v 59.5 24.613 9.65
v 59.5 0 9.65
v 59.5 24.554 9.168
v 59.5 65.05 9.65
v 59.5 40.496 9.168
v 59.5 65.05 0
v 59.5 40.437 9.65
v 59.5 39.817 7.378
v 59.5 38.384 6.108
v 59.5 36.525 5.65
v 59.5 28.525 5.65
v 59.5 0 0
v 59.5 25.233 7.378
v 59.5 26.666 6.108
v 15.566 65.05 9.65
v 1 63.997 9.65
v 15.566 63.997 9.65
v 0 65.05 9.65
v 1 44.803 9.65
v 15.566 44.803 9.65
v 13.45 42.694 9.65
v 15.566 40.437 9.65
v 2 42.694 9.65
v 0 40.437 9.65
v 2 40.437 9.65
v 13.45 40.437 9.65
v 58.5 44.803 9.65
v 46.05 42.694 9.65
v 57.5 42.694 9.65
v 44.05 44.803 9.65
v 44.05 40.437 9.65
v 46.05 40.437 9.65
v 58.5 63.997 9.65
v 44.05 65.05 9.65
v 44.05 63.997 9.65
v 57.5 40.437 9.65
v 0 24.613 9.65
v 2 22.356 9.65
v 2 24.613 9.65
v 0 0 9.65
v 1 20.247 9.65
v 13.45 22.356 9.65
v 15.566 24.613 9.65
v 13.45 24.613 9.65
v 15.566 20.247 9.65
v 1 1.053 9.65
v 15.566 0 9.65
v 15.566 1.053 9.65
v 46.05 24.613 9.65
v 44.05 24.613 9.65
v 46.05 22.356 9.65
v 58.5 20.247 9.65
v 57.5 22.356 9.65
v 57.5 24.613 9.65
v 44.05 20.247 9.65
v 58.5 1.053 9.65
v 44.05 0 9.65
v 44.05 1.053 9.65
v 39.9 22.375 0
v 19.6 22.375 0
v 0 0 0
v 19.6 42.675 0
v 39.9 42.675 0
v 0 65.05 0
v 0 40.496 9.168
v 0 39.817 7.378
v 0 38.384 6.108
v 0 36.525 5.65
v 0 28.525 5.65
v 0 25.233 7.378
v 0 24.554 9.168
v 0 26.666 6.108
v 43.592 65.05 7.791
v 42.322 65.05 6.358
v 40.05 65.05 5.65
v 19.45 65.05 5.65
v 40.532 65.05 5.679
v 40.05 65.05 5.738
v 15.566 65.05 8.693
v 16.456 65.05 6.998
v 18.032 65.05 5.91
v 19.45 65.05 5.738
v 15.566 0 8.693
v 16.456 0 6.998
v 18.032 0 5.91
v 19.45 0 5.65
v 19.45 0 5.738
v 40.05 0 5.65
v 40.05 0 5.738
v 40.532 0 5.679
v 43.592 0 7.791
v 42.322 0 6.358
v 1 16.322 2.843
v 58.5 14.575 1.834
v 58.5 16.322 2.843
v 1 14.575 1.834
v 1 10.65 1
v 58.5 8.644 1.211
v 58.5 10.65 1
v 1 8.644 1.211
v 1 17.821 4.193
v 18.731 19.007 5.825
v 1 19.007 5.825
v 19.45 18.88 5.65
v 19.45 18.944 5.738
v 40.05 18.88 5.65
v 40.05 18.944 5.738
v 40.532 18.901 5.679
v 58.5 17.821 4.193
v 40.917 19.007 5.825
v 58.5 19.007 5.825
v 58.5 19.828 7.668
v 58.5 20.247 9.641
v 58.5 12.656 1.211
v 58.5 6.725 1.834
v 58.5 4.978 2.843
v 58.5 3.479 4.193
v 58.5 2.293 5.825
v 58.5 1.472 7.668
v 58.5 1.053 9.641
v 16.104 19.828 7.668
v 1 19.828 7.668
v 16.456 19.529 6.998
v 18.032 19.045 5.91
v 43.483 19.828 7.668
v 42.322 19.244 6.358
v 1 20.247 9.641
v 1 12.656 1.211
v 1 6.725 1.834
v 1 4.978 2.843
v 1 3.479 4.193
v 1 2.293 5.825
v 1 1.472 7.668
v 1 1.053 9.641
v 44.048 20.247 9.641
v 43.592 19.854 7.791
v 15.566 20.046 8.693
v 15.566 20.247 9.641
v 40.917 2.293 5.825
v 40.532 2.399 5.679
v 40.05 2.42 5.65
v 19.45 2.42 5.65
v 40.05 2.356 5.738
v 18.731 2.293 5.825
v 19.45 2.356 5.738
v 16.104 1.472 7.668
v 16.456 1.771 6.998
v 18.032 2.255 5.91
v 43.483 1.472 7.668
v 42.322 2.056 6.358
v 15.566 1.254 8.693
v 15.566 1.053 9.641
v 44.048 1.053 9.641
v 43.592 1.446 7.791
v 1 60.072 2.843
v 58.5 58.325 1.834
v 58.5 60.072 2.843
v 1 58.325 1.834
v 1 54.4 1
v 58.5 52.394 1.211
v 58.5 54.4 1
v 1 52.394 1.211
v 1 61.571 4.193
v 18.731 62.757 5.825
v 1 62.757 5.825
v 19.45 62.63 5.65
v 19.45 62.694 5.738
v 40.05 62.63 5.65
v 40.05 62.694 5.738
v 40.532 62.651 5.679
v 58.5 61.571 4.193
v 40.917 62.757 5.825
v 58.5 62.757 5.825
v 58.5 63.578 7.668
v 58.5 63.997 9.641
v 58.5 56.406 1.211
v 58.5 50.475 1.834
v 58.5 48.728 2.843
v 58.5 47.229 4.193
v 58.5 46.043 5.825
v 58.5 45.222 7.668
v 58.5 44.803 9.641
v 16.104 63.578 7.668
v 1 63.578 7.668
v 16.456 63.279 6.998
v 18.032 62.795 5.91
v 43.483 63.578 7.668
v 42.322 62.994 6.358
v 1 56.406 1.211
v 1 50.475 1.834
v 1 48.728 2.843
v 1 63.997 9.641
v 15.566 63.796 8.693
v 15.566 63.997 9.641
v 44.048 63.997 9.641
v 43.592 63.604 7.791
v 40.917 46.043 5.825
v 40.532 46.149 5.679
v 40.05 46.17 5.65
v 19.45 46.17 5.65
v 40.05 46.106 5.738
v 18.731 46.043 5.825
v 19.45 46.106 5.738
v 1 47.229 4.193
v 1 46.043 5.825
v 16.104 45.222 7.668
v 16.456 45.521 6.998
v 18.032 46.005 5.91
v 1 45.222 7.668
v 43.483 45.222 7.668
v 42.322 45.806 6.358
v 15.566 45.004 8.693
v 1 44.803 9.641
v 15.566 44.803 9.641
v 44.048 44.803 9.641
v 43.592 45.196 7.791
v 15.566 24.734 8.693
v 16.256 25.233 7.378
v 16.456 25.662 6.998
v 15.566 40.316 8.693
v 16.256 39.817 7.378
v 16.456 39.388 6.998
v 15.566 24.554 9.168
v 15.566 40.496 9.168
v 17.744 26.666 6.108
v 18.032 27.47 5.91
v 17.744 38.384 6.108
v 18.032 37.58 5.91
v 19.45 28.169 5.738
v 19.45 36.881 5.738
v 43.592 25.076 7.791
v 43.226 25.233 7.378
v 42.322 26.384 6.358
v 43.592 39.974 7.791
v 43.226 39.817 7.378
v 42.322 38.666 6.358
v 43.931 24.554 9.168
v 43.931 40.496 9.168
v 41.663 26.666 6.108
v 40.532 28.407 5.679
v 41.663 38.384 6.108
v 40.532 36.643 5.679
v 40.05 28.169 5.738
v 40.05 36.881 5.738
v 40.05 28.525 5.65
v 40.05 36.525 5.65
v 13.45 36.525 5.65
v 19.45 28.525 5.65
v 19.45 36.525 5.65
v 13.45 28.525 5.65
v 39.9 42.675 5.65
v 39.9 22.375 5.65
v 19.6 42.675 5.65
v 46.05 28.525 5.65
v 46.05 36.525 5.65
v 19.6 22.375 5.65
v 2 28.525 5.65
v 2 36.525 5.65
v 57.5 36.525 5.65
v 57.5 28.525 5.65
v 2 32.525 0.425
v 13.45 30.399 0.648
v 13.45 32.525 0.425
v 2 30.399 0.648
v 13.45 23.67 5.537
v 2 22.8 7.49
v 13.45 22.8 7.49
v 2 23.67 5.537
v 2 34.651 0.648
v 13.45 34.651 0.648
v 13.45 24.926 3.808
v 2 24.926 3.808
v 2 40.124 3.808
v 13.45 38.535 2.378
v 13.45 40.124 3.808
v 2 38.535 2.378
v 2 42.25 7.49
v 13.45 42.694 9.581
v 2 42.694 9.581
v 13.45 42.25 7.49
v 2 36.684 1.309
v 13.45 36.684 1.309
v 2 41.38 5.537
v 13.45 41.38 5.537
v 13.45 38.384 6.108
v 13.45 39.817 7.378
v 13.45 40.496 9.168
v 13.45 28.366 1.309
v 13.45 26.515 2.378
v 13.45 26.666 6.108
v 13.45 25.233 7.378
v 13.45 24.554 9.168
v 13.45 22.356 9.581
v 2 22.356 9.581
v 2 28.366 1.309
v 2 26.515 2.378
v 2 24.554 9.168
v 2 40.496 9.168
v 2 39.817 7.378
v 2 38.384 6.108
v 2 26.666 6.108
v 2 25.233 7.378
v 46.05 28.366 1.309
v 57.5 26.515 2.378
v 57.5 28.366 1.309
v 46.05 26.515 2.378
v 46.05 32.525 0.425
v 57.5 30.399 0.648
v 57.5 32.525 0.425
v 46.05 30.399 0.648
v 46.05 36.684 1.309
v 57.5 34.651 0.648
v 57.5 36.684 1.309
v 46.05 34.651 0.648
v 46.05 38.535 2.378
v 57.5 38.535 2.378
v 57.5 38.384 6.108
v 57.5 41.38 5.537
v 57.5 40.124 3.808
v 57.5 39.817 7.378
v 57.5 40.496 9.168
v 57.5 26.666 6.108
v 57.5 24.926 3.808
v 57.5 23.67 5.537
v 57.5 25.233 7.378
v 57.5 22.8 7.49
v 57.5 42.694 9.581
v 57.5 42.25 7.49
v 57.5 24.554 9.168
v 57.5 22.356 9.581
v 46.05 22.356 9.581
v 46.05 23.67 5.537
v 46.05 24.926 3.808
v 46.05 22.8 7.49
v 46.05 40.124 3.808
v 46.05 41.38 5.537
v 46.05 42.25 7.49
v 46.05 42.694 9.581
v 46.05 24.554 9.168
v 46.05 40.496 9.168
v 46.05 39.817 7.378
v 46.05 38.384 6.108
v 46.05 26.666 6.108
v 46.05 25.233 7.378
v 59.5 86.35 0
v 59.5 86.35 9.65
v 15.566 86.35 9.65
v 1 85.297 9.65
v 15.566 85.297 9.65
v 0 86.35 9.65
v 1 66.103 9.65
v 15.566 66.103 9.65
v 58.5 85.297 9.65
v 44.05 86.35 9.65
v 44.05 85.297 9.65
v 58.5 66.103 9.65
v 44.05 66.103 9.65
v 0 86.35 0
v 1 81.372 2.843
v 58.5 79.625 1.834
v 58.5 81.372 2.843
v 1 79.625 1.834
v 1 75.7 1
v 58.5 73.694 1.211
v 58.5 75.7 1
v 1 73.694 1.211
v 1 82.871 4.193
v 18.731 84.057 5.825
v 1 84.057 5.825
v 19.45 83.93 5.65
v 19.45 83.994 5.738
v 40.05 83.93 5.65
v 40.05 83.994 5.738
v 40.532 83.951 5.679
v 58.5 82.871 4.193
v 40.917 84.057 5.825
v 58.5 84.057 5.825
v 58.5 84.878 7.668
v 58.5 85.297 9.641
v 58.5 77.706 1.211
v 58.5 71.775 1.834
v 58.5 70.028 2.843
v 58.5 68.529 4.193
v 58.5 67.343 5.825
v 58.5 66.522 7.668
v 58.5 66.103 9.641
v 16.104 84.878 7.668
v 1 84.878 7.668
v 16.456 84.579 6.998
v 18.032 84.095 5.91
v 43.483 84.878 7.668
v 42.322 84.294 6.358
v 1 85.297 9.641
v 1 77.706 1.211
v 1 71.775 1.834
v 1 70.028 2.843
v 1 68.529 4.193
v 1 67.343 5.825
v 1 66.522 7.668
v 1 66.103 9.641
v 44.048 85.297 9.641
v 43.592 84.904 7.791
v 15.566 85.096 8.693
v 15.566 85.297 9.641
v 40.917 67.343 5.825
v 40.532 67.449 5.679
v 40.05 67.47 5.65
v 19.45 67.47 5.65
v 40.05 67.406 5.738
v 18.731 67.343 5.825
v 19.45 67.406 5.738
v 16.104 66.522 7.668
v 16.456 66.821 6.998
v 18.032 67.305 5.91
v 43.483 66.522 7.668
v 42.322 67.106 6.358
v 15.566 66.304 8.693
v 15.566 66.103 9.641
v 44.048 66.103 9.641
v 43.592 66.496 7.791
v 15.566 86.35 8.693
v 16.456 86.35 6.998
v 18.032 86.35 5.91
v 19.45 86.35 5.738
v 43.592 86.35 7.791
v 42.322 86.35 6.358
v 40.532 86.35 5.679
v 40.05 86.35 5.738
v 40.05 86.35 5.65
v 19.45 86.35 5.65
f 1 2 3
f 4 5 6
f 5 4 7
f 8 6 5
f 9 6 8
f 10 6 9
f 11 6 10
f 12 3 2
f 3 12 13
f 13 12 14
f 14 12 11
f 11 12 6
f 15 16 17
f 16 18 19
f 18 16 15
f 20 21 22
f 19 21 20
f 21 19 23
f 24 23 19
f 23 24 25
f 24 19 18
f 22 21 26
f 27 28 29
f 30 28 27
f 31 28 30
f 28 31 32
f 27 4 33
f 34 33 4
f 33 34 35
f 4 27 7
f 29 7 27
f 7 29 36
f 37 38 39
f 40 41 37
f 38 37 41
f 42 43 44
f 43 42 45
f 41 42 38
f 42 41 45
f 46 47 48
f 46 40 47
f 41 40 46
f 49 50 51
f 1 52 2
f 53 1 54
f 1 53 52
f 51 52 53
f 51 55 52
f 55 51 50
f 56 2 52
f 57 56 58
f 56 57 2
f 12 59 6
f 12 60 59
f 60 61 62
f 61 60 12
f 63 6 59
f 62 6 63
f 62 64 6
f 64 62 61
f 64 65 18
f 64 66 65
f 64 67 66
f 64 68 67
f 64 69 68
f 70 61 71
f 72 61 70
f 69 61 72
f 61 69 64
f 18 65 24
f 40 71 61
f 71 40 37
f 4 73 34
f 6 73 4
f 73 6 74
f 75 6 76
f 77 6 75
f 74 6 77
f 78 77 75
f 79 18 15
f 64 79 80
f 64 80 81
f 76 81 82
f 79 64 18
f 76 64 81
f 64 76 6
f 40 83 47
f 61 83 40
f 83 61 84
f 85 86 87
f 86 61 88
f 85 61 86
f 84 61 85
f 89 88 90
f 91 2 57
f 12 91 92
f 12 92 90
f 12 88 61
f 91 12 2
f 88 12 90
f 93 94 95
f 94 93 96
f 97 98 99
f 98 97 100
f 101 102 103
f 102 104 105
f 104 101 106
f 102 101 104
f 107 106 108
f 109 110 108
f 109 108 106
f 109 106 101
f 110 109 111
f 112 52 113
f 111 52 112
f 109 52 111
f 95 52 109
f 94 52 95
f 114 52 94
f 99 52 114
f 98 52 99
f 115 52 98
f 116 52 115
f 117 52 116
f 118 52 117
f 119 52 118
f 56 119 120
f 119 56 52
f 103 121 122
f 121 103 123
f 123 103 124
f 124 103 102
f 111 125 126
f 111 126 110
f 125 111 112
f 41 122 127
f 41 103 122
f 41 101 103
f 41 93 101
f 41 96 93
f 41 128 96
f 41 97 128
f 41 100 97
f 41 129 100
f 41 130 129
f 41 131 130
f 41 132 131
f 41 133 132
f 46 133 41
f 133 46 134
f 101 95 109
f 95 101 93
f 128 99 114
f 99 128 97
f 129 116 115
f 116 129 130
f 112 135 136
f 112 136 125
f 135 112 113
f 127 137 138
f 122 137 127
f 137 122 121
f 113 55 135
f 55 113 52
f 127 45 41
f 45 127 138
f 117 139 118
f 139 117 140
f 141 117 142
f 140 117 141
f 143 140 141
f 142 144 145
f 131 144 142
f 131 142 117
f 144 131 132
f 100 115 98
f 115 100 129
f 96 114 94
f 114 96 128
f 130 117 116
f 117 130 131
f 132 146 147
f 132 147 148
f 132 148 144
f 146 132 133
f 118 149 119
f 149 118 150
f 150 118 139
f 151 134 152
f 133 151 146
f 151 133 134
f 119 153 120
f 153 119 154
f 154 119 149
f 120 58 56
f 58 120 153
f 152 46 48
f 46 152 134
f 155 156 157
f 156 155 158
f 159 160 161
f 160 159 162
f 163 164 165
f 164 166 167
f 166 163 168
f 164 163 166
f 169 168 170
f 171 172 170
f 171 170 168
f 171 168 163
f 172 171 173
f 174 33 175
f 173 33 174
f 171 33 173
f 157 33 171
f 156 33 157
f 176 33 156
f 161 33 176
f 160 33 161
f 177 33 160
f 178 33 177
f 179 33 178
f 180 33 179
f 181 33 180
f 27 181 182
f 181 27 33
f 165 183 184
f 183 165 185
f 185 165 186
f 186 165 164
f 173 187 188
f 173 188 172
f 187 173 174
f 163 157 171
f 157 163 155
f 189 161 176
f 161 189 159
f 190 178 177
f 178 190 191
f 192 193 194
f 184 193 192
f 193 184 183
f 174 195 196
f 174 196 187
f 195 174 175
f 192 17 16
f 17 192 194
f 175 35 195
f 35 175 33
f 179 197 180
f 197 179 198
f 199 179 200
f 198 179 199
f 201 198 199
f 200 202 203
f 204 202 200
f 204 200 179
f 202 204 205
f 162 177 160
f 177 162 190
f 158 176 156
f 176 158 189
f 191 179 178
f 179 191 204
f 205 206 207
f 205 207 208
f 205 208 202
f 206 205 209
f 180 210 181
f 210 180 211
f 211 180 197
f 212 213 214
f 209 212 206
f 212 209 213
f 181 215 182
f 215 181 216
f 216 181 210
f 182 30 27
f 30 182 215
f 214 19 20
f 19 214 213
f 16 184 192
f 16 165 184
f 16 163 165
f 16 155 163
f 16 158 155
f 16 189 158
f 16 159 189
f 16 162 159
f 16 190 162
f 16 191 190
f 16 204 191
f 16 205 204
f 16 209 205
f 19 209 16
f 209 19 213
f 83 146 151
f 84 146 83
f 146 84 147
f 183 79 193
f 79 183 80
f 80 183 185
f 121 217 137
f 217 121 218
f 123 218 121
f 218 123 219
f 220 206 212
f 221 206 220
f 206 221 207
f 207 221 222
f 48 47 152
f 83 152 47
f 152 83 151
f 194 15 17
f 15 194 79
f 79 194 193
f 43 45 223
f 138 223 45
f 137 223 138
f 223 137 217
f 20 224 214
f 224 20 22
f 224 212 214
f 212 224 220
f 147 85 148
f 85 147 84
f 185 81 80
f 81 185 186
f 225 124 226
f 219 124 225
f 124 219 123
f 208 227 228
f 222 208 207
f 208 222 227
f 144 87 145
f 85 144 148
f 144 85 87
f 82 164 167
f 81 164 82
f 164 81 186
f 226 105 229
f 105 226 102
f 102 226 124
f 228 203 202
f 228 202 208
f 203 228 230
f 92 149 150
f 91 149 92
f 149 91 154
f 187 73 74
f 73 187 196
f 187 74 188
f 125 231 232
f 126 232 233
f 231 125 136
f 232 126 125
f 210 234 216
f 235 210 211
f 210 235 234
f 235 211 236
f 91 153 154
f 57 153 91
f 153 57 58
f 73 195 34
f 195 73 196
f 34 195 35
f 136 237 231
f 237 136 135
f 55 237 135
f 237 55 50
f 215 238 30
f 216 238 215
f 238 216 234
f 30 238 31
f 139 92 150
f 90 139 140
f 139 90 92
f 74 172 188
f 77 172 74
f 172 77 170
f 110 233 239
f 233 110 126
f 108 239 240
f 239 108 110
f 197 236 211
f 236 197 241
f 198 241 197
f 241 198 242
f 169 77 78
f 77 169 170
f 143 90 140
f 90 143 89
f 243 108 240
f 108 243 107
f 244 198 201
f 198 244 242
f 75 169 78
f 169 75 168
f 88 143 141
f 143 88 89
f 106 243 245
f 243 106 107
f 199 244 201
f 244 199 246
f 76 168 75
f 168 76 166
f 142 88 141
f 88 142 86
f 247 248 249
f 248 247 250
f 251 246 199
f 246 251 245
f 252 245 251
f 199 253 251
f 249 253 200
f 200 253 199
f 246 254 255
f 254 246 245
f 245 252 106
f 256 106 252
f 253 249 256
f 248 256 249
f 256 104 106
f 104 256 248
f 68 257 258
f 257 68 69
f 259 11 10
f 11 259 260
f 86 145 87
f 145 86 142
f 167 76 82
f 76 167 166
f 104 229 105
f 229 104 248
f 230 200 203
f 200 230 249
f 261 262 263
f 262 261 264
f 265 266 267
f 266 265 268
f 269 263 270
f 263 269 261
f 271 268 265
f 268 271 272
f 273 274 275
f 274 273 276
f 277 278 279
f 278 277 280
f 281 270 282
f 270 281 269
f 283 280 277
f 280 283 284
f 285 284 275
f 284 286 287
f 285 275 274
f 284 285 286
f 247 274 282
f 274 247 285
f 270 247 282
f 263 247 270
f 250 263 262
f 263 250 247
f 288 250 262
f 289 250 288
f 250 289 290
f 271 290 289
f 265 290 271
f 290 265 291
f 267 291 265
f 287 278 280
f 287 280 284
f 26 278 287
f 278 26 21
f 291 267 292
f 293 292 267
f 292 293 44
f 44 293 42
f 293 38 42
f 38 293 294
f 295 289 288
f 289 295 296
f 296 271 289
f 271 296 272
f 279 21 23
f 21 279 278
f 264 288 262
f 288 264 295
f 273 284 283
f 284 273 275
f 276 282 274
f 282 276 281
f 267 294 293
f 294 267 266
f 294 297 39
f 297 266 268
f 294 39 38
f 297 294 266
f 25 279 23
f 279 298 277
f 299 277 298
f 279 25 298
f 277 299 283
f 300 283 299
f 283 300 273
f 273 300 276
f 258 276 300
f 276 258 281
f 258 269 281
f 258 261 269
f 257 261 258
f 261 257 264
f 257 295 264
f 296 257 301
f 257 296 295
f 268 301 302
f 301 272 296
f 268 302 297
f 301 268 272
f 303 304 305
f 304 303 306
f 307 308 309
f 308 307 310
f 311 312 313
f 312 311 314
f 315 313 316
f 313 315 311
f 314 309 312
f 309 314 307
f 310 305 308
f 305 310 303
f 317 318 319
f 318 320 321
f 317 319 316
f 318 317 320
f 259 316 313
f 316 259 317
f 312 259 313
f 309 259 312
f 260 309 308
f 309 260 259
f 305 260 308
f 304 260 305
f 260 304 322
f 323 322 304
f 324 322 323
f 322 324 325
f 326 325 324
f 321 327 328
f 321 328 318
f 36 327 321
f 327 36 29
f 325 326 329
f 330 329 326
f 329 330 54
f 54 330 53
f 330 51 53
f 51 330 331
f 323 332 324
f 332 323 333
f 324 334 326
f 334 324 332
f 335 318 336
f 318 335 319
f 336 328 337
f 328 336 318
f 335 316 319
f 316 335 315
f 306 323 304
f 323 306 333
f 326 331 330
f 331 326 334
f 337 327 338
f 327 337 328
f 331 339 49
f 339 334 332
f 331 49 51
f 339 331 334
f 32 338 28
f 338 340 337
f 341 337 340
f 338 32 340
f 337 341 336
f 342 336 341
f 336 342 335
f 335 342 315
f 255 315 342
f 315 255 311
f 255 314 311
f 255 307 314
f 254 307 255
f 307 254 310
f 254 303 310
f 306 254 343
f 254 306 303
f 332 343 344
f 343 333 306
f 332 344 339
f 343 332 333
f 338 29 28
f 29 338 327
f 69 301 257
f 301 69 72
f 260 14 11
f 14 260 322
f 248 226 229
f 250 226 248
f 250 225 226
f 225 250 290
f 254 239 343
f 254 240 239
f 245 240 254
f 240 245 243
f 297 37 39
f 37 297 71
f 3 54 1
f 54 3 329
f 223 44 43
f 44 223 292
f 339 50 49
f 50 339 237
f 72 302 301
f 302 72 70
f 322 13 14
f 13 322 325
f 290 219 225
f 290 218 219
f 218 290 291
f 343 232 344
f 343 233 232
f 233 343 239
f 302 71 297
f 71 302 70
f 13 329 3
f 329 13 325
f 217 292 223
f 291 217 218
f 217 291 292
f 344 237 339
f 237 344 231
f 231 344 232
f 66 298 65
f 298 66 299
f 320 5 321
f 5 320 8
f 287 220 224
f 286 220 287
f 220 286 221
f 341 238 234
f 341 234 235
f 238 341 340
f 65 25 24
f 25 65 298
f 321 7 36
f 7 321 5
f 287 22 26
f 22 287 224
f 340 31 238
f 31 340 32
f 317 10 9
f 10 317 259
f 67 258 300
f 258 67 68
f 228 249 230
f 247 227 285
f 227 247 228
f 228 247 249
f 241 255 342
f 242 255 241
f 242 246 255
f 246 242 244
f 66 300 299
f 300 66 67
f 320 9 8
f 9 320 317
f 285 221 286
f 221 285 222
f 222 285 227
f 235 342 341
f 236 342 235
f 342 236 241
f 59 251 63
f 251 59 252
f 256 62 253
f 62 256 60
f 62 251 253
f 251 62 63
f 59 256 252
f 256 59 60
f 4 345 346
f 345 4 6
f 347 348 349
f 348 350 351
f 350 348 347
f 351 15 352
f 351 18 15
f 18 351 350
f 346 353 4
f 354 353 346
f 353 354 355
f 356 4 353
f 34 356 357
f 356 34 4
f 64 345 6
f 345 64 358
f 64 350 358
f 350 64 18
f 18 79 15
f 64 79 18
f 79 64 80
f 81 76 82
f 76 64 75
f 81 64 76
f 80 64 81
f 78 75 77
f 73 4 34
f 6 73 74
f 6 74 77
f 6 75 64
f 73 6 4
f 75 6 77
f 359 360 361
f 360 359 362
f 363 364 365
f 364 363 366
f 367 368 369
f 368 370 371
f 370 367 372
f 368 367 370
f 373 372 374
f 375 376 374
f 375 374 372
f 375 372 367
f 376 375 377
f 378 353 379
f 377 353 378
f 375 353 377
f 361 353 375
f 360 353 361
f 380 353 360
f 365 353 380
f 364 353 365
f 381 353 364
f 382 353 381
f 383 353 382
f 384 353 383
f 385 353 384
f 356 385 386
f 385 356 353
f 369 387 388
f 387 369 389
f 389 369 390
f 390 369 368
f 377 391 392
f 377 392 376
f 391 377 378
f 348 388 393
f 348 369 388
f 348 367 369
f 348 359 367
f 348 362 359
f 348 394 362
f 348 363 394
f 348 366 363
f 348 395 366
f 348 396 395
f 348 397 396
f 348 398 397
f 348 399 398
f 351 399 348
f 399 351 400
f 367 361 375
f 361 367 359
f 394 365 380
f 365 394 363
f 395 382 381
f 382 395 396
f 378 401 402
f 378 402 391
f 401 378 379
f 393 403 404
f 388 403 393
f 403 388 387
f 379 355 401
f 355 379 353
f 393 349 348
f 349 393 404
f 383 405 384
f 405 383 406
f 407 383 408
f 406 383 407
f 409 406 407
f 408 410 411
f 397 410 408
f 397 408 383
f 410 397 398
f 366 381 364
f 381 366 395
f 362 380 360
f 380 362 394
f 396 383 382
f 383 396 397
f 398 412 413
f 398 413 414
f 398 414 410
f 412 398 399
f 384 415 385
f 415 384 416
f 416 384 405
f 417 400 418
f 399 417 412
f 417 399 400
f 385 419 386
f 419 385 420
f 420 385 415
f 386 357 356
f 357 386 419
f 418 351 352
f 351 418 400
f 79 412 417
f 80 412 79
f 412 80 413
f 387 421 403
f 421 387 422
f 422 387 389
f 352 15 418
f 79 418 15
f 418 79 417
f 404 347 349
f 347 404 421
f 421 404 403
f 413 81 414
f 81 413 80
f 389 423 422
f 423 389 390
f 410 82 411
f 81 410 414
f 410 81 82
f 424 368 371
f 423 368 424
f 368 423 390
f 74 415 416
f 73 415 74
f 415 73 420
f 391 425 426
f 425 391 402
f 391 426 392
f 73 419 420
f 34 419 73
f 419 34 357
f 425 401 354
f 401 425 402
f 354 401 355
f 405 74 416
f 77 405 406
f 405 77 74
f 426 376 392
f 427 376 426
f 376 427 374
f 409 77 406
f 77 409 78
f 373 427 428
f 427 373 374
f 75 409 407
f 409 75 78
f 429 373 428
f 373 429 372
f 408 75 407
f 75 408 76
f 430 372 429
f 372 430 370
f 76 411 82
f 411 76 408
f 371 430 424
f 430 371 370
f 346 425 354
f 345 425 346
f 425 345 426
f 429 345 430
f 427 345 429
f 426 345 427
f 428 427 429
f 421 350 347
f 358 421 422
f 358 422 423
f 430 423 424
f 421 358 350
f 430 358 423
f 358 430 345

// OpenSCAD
thinThreadHeight = 57.5;
thinThreadDiam = 19.3;
thinThreadRad = thinThreadDiam / 2;

lowerBobbinDiam = 20.45;
lowerBobbinRad = lowerBobbinDiam / 2;
lowerBobbinHeight = 11.45;

wallThickness = 1;
doubleWall = wallThickness * 2;

boxHeight = thinThreadDiam / 2;

totalWidth = (2 * thinThreadDiam) + lowerBobbinDiam + (3 * doubleWall);
totalHeight = thinThreadHeight + (doubleWall);
 

module twoThinTwoBobbin(x, y, z) { 
    translate([x, y, z]) {
        difference() {
            cube([totalHeight, totalWidth , boxHeight]);

            // cutout for the left thread holder
            translate([wallThickness, wallThickness + thinThreadRad, wallThickness + thinThreadRad]) {
                rotate([0, 90, 0]) {
                    cylinder(thinThreadHeight, r=thinThreadRad);
                }
                
            }

            // cutout for the right thread holder
            translate([wallThickness, totalWidth - wallThickness - thinThreadRad, wallThickness + thinThreadRad]) {
                rotate([0, 90, 0]) {
                    cylinder(thinThreadHeight, r=thinThreadRad);
                }
            }
            
            // cut a finger grab through the width for the thin bobbins
            breakoutTransferseWidth = ((totalHeight - (2*lowerBobbinHeight)) - (8*doubleWall));
            translate([totalHeight/2 - breakoutTransferseWidth/2, 0, boxHeight]) {
                rotate([270, 0, 0]) {
                        cylinder(totalWidth, r=2*doubleWall);
                }
            }
            translate([totalHeight/2 + breakoutTransferseWidth/2, 0, boxHeight]) {
                rotate([270, 0, 0]) {
                        cylinder(totalWidth, r=2*doubleWall);
                }
            }    
            
            translate([totalHeight/2, totalWidth / 2, boxHeight]) {
                cube([breakoutTransferseWidth, totalWidth, 4*doubleWall], center=true);
            }

            
            
            // cutout for the top bobbin
            translate([doubleWall, totalWidth / 2, wallThickness + thinThreadRad]) {
                rotate([0, 90, 0]) {
                    cylinder(lowerBobbinHeight, r=lowerBobbinRad);
                }
            }
            
            // cutout for the bottom bobbin
            translate([totalHeight - (doubleWall + lowerBobbinHeight), totalWidth / 2, wallThickness + thinThreadRad]) {
                rotate([0, 90, 0]) {
                    cylinder(lowerBobbinHeight, r=lowerBobbinRad);
                }
            }
            
            // cutout finger grabbers for the smaller bobbins
            translate([0, totalWidth / 2 - 2*doubleWall, boxHeight]) {
                rotate([0, 90, 0]) {
                    cylinder(totalHeight, r=2*doubleWall); 
                }
            }        
            translate([0, totalWidth / 2 + 2*doubleWall, boxHeight]) {
                rotate([0, 90, 0]) {
                    cylinder(totalHeight, r=2*doubleWall); 
                }
            }   
            translate([totalHeight / 2, totalWidth / 2, boxHeight]) {
                cube([totalHeight, 4*doubleWall, 4*doubleWall], center = true);
            }    

            // cut out the center
            translate([totalHeight / 2, totalWidth / 2, boxHeight]) {
                cube(boxHeight*2+wallThickness, center=true);
                
            }
            
        }
    }
}

twoThinTwoBobbin(0, 0, 0);
difference() {
    twoThinTwoBobbin(0, totalWidth, 0);
    translate([0, totalWidth + thinThreadDiam + doubleWall, 0])
        cube([100, 100 , 45]);
}


           
        
